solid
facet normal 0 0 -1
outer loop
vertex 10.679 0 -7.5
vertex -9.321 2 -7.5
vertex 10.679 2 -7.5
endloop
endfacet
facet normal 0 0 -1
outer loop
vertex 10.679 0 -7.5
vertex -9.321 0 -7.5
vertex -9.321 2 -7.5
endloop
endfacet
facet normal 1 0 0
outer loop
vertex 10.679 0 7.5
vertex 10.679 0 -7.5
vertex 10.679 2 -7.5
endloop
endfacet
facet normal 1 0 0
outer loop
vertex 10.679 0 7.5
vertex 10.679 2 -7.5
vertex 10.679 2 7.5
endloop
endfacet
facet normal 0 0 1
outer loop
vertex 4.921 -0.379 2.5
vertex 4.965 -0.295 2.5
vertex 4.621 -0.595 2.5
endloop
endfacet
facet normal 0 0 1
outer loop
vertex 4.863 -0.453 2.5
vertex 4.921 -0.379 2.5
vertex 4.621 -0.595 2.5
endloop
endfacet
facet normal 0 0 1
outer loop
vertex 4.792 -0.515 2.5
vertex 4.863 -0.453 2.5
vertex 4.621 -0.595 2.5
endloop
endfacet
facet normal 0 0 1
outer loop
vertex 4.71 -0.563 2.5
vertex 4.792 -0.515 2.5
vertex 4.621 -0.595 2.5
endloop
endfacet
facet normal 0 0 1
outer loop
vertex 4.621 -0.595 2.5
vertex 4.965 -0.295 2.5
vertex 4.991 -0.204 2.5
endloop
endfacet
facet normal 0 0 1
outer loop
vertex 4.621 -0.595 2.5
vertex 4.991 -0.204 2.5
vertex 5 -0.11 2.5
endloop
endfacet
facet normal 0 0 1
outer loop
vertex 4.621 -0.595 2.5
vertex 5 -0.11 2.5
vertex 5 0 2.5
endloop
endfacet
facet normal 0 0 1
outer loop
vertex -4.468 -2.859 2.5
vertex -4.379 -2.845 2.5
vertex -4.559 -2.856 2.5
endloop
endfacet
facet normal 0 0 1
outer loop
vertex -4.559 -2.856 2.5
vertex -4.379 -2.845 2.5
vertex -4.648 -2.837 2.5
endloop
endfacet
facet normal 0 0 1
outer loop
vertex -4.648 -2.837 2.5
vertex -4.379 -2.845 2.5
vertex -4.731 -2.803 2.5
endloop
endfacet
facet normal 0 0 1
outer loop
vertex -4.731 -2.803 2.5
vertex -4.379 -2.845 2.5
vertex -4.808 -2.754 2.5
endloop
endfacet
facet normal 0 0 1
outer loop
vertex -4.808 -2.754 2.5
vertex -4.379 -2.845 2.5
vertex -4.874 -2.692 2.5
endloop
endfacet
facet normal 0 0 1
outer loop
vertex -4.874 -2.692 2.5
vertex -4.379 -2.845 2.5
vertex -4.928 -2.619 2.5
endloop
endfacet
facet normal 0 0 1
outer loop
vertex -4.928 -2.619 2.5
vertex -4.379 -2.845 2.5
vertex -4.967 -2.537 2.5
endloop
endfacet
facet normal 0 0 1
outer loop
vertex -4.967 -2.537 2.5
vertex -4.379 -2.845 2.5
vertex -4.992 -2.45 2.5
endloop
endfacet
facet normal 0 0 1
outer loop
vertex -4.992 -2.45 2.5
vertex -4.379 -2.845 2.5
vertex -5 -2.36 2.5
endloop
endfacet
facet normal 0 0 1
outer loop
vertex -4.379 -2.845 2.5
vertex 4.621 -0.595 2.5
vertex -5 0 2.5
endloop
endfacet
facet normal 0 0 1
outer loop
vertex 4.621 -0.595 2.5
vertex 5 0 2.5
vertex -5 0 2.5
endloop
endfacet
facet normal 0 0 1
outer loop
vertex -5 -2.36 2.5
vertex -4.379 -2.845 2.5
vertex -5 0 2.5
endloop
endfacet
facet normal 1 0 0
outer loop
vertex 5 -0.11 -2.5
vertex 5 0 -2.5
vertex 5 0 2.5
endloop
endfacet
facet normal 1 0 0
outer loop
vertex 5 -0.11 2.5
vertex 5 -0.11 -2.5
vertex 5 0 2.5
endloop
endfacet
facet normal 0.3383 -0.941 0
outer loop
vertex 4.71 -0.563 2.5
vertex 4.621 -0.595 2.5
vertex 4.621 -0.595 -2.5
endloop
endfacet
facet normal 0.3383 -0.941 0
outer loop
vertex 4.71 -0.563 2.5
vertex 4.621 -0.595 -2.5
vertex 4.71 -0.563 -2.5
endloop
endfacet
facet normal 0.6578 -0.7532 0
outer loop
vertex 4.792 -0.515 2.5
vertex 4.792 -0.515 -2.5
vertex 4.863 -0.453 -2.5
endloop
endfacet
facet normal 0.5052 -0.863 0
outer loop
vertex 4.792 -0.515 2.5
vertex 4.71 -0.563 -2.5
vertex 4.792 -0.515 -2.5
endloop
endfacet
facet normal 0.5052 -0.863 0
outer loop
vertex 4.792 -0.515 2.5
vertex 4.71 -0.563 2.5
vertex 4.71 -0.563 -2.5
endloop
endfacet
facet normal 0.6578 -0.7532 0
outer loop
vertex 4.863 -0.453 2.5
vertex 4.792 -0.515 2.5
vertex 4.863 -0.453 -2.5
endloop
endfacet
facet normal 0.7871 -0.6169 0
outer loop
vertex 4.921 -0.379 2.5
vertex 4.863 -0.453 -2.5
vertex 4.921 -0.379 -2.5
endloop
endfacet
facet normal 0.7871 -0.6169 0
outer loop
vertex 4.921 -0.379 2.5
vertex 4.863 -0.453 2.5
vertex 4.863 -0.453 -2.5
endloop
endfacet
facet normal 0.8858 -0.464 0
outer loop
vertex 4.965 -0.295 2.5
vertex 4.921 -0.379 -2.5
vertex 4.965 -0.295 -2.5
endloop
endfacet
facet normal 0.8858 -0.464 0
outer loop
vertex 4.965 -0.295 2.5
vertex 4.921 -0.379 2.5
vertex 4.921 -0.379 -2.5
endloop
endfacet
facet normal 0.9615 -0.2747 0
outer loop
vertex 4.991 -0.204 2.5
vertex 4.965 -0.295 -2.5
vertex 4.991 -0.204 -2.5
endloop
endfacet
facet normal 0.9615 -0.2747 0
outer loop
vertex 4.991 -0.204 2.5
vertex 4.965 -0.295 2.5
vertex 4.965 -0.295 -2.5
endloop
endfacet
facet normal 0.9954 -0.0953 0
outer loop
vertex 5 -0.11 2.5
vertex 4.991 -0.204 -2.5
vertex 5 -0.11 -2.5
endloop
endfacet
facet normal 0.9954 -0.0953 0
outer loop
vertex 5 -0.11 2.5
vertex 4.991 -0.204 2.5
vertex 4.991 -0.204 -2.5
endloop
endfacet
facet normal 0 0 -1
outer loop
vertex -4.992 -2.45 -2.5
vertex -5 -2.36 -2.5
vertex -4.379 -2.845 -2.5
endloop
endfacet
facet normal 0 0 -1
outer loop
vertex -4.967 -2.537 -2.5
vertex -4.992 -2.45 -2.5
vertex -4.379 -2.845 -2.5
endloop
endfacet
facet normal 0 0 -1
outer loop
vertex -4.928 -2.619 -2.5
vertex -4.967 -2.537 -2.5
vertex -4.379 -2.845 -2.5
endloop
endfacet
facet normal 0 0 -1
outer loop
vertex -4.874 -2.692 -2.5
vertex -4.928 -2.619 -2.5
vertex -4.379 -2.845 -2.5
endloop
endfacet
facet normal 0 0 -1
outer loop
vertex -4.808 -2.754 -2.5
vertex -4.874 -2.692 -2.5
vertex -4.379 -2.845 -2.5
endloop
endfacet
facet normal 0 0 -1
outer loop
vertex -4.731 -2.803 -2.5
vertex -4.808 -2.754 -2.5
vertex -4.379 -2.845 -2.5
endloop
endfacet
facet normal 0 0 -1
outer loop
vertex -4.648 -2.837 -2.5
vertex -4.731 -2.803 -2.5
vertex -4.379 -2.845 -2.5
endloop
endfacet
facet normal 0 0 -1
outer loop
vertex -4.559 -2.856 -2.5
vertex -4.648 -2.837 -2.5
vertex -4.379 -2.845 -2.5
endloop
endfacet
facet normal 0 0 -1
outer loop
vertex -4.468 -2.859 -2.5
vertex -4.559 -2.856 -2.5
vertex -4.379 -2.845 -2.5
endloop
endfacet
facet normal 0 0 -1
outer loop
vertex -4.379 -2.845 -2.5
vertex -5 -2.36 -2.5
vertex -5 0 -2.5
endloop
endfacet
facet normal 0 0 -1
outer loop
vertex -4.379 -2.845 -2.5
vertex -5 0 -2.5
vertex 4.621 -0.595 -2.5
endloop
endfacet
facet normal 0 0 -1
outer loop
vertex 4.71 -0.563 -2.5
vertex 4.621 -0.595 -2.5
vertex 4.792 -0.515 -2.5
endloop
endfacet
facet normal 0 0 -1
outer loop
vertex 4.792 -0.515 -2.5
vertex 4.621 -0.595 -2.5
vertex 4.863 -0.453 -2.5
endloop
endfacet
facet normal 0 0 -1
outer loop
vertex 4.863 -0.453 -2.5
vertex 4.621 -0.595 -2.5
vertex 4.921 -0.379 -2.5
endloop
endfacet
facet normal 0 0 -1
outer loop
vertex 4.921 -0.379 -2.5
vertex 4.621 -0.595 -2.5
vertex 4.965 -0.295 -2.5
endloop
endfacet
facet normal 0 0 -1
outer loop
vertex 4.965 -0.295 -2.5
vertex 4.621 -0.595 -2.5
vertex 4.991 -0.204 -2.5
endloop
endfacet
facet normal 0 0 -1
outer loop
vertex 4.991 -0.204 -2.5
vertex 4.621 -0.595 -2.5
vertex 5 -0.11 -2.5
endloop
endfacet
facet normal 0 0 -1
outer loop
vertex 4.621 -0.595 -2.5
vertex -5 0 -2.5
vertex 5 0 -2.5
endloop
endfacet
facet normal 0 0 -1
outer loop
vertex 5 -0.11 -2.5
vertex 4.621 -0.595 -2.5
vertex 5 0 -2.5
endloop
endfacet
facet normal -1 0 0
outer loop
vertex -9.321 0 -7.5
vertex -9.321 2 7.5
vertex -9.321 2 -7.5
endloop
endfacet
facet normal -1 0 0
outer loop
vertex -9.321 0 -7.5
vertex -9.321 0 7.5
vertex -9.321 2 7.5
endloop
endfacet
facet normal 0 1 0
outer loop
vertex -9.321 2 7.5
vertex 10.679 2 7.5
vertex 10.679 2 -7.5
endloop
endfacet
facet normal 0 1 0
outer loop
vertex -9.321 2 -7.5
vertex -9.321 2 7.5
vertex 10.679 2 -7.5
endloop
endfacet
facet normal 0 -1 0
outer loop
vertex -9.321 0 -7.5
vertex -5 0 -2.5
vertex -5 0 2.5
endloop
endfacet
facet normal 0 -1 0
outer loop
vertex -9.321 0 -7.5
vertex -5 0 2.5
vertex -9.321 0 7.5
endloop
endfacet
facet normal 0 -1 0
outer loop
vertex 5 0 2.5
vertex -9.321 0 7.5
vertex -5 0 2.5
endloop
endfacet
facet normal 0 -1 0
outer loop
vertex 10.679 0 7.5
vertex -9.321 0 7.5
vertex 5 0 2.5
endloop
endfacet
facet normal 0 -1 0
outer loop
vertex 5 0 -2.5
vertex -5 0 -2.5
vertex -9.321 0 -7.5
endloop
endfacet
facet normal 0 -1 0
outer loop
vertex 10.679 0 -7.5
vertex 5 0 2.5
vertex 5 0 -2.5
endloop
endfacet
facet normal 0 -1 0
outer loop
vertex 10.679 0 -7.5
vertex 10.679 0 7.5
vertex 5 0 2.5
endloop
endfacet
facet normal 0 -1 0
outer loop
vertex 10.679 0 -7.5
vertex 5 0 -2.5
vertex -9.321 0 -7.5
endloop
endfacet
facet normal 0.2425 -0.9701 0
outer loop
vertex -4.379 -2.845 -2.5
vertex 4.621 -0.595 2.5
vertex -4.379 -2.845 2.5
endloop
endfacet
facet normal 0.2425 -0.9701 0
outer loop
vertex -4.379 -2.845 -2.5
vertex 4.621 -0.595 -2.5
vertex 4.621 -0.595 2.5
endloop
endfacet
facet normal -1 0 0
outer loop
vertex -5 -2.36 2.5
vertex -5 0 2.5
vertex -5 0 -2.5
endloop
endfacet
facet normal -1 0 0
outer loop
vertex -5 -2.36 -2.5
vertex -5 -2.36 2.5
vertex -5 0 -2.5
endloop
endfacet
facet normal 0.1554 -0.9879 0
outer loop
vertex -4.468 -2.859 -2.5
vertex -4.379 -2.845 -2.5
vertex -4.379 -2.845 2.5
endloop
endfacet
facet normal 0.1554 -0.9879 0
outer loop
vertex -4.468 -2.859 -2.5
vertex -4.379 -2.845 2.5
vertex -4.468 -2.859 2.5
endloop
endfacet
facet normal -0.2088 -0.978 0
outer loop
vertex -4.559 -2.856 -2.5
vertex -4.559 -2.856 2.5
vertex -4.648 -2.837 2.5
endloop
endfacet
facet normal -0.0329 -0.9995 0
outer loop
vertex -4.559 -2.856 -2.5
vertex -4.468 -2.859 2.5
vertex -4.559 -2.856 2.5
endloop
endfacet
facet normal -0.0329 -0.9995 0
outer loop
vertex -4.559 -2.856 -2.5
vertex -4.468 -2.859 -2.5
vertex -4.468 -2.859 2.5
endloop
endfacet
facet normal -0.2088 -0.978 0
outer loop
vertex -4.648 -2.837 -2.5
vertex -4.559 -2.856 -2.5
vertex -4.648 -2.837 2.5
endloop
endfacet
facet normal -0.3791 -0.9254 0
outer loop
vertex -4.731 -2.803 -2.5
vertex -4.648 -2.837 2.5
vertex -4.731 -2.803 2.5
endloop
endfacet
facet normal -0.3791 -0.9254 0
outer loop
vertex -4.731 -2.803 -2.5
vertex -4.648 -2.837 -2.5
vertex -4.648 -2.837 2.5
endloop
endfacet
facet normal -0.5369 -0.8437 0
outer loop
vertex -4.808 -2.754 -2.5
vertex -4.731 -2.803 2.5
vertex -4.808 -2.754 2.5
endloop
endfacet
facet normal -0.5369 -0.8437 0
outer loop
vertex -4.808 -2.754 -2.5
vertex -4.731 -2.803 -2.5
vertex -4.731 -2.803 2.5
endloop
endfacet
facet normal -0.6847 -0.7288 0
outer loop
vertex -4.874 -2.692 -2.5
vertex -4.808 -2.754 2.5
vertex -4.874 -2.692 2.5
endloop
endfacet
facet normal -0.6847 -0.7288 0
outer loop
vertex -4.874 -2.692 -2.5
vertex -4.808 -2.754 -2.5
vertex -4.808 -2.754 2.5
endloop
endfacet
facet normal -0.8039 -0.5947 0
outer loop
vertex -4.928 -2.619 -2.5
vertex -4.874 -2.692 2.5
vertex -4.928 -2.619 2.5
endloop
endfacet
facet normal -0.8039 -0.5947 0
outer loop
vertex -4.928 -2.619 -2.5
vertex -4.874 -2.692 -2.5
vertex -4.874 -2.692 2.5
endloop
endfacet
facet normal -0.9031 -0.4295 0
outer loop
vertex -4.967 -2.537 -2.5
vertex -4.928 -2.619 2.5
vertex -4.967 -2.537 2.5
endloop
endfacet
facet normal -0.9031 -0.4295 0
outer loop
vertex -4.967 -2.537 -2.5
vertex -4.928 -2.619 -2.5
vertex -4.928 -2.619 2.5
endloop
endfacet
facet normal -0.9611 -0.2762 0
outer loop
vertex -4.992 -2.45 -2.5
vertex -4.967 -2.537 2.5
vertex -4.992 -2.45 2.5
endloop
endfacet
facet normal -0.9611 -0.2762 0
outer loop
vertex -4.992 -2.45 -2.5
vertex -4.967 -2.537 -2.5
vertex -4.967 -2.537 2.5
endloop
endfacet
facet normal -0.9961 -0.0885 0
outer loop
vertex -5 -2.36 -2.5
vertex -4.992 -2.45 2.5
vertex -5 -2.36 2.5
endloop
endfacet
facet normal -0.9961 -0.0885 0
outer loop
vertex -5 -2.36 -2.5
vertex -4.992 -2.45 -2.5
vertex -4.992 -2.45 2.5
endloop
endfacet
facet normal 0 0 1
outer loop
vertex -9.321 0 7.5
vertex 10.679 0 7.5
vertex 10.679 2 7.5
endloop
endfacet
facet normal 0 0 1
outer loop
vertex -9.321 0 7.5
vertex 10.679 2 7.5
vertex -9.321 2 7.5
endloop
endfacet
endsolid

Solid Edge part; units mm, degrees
sketch "Sketch1" plane through (0, 0, 0) normal (0, -1, 0) x (1, 0, 0)
  line L0 (10.6791, 7.5) -> (-9.3209, 7.5)
  line L1 (-9.3209, 7.5) -> (-9.3209, -7.5)
  line L2 (-9.3209, -7.5) -> (10.6791, -7.5)
  line L3 (10.6791, -7.5) -> (10.6791, 7.5)
extrude "Protrusion1" add sketch "Sketch1" against normal blind 2
sketch "Sketch2" plane through (0.6791, 0, 0) normal (0, -1, 0) x (1, 0, 0)
  line L0 (4.3209, 2.5) -> (-5.6791, 2.5)
  line L1 (-5.6791, 2.5) -> (-5.6791, -2.5)
  line L2 (-5.6791, -2.5) -> (4.3209, -2.5)
  line L3 (4.3209, -2.5) -> (4.3209, 2.5)
extrude "ExtrudedProtrusion_2" add sketch "Sketch2" along normal blind 3
sketch "Sketch3" plane through (0, -1.5, -2.5) normal (0, 0, -1) x (1, 0, 0)
  line L0 (5, 1.5) -> (5, -1)
  line L1 (5, -1) -> (-5, 1.5)
  line L2 (-5, 1.5) -> (5, 1.5)
extrude "ExtrudedCutout_2" cut sketch "Sketch3" against normal blind 5
fillet "Round_2" radius 0.5 2 edges at (-5, -3, 0) (5, -0.5, 0)
